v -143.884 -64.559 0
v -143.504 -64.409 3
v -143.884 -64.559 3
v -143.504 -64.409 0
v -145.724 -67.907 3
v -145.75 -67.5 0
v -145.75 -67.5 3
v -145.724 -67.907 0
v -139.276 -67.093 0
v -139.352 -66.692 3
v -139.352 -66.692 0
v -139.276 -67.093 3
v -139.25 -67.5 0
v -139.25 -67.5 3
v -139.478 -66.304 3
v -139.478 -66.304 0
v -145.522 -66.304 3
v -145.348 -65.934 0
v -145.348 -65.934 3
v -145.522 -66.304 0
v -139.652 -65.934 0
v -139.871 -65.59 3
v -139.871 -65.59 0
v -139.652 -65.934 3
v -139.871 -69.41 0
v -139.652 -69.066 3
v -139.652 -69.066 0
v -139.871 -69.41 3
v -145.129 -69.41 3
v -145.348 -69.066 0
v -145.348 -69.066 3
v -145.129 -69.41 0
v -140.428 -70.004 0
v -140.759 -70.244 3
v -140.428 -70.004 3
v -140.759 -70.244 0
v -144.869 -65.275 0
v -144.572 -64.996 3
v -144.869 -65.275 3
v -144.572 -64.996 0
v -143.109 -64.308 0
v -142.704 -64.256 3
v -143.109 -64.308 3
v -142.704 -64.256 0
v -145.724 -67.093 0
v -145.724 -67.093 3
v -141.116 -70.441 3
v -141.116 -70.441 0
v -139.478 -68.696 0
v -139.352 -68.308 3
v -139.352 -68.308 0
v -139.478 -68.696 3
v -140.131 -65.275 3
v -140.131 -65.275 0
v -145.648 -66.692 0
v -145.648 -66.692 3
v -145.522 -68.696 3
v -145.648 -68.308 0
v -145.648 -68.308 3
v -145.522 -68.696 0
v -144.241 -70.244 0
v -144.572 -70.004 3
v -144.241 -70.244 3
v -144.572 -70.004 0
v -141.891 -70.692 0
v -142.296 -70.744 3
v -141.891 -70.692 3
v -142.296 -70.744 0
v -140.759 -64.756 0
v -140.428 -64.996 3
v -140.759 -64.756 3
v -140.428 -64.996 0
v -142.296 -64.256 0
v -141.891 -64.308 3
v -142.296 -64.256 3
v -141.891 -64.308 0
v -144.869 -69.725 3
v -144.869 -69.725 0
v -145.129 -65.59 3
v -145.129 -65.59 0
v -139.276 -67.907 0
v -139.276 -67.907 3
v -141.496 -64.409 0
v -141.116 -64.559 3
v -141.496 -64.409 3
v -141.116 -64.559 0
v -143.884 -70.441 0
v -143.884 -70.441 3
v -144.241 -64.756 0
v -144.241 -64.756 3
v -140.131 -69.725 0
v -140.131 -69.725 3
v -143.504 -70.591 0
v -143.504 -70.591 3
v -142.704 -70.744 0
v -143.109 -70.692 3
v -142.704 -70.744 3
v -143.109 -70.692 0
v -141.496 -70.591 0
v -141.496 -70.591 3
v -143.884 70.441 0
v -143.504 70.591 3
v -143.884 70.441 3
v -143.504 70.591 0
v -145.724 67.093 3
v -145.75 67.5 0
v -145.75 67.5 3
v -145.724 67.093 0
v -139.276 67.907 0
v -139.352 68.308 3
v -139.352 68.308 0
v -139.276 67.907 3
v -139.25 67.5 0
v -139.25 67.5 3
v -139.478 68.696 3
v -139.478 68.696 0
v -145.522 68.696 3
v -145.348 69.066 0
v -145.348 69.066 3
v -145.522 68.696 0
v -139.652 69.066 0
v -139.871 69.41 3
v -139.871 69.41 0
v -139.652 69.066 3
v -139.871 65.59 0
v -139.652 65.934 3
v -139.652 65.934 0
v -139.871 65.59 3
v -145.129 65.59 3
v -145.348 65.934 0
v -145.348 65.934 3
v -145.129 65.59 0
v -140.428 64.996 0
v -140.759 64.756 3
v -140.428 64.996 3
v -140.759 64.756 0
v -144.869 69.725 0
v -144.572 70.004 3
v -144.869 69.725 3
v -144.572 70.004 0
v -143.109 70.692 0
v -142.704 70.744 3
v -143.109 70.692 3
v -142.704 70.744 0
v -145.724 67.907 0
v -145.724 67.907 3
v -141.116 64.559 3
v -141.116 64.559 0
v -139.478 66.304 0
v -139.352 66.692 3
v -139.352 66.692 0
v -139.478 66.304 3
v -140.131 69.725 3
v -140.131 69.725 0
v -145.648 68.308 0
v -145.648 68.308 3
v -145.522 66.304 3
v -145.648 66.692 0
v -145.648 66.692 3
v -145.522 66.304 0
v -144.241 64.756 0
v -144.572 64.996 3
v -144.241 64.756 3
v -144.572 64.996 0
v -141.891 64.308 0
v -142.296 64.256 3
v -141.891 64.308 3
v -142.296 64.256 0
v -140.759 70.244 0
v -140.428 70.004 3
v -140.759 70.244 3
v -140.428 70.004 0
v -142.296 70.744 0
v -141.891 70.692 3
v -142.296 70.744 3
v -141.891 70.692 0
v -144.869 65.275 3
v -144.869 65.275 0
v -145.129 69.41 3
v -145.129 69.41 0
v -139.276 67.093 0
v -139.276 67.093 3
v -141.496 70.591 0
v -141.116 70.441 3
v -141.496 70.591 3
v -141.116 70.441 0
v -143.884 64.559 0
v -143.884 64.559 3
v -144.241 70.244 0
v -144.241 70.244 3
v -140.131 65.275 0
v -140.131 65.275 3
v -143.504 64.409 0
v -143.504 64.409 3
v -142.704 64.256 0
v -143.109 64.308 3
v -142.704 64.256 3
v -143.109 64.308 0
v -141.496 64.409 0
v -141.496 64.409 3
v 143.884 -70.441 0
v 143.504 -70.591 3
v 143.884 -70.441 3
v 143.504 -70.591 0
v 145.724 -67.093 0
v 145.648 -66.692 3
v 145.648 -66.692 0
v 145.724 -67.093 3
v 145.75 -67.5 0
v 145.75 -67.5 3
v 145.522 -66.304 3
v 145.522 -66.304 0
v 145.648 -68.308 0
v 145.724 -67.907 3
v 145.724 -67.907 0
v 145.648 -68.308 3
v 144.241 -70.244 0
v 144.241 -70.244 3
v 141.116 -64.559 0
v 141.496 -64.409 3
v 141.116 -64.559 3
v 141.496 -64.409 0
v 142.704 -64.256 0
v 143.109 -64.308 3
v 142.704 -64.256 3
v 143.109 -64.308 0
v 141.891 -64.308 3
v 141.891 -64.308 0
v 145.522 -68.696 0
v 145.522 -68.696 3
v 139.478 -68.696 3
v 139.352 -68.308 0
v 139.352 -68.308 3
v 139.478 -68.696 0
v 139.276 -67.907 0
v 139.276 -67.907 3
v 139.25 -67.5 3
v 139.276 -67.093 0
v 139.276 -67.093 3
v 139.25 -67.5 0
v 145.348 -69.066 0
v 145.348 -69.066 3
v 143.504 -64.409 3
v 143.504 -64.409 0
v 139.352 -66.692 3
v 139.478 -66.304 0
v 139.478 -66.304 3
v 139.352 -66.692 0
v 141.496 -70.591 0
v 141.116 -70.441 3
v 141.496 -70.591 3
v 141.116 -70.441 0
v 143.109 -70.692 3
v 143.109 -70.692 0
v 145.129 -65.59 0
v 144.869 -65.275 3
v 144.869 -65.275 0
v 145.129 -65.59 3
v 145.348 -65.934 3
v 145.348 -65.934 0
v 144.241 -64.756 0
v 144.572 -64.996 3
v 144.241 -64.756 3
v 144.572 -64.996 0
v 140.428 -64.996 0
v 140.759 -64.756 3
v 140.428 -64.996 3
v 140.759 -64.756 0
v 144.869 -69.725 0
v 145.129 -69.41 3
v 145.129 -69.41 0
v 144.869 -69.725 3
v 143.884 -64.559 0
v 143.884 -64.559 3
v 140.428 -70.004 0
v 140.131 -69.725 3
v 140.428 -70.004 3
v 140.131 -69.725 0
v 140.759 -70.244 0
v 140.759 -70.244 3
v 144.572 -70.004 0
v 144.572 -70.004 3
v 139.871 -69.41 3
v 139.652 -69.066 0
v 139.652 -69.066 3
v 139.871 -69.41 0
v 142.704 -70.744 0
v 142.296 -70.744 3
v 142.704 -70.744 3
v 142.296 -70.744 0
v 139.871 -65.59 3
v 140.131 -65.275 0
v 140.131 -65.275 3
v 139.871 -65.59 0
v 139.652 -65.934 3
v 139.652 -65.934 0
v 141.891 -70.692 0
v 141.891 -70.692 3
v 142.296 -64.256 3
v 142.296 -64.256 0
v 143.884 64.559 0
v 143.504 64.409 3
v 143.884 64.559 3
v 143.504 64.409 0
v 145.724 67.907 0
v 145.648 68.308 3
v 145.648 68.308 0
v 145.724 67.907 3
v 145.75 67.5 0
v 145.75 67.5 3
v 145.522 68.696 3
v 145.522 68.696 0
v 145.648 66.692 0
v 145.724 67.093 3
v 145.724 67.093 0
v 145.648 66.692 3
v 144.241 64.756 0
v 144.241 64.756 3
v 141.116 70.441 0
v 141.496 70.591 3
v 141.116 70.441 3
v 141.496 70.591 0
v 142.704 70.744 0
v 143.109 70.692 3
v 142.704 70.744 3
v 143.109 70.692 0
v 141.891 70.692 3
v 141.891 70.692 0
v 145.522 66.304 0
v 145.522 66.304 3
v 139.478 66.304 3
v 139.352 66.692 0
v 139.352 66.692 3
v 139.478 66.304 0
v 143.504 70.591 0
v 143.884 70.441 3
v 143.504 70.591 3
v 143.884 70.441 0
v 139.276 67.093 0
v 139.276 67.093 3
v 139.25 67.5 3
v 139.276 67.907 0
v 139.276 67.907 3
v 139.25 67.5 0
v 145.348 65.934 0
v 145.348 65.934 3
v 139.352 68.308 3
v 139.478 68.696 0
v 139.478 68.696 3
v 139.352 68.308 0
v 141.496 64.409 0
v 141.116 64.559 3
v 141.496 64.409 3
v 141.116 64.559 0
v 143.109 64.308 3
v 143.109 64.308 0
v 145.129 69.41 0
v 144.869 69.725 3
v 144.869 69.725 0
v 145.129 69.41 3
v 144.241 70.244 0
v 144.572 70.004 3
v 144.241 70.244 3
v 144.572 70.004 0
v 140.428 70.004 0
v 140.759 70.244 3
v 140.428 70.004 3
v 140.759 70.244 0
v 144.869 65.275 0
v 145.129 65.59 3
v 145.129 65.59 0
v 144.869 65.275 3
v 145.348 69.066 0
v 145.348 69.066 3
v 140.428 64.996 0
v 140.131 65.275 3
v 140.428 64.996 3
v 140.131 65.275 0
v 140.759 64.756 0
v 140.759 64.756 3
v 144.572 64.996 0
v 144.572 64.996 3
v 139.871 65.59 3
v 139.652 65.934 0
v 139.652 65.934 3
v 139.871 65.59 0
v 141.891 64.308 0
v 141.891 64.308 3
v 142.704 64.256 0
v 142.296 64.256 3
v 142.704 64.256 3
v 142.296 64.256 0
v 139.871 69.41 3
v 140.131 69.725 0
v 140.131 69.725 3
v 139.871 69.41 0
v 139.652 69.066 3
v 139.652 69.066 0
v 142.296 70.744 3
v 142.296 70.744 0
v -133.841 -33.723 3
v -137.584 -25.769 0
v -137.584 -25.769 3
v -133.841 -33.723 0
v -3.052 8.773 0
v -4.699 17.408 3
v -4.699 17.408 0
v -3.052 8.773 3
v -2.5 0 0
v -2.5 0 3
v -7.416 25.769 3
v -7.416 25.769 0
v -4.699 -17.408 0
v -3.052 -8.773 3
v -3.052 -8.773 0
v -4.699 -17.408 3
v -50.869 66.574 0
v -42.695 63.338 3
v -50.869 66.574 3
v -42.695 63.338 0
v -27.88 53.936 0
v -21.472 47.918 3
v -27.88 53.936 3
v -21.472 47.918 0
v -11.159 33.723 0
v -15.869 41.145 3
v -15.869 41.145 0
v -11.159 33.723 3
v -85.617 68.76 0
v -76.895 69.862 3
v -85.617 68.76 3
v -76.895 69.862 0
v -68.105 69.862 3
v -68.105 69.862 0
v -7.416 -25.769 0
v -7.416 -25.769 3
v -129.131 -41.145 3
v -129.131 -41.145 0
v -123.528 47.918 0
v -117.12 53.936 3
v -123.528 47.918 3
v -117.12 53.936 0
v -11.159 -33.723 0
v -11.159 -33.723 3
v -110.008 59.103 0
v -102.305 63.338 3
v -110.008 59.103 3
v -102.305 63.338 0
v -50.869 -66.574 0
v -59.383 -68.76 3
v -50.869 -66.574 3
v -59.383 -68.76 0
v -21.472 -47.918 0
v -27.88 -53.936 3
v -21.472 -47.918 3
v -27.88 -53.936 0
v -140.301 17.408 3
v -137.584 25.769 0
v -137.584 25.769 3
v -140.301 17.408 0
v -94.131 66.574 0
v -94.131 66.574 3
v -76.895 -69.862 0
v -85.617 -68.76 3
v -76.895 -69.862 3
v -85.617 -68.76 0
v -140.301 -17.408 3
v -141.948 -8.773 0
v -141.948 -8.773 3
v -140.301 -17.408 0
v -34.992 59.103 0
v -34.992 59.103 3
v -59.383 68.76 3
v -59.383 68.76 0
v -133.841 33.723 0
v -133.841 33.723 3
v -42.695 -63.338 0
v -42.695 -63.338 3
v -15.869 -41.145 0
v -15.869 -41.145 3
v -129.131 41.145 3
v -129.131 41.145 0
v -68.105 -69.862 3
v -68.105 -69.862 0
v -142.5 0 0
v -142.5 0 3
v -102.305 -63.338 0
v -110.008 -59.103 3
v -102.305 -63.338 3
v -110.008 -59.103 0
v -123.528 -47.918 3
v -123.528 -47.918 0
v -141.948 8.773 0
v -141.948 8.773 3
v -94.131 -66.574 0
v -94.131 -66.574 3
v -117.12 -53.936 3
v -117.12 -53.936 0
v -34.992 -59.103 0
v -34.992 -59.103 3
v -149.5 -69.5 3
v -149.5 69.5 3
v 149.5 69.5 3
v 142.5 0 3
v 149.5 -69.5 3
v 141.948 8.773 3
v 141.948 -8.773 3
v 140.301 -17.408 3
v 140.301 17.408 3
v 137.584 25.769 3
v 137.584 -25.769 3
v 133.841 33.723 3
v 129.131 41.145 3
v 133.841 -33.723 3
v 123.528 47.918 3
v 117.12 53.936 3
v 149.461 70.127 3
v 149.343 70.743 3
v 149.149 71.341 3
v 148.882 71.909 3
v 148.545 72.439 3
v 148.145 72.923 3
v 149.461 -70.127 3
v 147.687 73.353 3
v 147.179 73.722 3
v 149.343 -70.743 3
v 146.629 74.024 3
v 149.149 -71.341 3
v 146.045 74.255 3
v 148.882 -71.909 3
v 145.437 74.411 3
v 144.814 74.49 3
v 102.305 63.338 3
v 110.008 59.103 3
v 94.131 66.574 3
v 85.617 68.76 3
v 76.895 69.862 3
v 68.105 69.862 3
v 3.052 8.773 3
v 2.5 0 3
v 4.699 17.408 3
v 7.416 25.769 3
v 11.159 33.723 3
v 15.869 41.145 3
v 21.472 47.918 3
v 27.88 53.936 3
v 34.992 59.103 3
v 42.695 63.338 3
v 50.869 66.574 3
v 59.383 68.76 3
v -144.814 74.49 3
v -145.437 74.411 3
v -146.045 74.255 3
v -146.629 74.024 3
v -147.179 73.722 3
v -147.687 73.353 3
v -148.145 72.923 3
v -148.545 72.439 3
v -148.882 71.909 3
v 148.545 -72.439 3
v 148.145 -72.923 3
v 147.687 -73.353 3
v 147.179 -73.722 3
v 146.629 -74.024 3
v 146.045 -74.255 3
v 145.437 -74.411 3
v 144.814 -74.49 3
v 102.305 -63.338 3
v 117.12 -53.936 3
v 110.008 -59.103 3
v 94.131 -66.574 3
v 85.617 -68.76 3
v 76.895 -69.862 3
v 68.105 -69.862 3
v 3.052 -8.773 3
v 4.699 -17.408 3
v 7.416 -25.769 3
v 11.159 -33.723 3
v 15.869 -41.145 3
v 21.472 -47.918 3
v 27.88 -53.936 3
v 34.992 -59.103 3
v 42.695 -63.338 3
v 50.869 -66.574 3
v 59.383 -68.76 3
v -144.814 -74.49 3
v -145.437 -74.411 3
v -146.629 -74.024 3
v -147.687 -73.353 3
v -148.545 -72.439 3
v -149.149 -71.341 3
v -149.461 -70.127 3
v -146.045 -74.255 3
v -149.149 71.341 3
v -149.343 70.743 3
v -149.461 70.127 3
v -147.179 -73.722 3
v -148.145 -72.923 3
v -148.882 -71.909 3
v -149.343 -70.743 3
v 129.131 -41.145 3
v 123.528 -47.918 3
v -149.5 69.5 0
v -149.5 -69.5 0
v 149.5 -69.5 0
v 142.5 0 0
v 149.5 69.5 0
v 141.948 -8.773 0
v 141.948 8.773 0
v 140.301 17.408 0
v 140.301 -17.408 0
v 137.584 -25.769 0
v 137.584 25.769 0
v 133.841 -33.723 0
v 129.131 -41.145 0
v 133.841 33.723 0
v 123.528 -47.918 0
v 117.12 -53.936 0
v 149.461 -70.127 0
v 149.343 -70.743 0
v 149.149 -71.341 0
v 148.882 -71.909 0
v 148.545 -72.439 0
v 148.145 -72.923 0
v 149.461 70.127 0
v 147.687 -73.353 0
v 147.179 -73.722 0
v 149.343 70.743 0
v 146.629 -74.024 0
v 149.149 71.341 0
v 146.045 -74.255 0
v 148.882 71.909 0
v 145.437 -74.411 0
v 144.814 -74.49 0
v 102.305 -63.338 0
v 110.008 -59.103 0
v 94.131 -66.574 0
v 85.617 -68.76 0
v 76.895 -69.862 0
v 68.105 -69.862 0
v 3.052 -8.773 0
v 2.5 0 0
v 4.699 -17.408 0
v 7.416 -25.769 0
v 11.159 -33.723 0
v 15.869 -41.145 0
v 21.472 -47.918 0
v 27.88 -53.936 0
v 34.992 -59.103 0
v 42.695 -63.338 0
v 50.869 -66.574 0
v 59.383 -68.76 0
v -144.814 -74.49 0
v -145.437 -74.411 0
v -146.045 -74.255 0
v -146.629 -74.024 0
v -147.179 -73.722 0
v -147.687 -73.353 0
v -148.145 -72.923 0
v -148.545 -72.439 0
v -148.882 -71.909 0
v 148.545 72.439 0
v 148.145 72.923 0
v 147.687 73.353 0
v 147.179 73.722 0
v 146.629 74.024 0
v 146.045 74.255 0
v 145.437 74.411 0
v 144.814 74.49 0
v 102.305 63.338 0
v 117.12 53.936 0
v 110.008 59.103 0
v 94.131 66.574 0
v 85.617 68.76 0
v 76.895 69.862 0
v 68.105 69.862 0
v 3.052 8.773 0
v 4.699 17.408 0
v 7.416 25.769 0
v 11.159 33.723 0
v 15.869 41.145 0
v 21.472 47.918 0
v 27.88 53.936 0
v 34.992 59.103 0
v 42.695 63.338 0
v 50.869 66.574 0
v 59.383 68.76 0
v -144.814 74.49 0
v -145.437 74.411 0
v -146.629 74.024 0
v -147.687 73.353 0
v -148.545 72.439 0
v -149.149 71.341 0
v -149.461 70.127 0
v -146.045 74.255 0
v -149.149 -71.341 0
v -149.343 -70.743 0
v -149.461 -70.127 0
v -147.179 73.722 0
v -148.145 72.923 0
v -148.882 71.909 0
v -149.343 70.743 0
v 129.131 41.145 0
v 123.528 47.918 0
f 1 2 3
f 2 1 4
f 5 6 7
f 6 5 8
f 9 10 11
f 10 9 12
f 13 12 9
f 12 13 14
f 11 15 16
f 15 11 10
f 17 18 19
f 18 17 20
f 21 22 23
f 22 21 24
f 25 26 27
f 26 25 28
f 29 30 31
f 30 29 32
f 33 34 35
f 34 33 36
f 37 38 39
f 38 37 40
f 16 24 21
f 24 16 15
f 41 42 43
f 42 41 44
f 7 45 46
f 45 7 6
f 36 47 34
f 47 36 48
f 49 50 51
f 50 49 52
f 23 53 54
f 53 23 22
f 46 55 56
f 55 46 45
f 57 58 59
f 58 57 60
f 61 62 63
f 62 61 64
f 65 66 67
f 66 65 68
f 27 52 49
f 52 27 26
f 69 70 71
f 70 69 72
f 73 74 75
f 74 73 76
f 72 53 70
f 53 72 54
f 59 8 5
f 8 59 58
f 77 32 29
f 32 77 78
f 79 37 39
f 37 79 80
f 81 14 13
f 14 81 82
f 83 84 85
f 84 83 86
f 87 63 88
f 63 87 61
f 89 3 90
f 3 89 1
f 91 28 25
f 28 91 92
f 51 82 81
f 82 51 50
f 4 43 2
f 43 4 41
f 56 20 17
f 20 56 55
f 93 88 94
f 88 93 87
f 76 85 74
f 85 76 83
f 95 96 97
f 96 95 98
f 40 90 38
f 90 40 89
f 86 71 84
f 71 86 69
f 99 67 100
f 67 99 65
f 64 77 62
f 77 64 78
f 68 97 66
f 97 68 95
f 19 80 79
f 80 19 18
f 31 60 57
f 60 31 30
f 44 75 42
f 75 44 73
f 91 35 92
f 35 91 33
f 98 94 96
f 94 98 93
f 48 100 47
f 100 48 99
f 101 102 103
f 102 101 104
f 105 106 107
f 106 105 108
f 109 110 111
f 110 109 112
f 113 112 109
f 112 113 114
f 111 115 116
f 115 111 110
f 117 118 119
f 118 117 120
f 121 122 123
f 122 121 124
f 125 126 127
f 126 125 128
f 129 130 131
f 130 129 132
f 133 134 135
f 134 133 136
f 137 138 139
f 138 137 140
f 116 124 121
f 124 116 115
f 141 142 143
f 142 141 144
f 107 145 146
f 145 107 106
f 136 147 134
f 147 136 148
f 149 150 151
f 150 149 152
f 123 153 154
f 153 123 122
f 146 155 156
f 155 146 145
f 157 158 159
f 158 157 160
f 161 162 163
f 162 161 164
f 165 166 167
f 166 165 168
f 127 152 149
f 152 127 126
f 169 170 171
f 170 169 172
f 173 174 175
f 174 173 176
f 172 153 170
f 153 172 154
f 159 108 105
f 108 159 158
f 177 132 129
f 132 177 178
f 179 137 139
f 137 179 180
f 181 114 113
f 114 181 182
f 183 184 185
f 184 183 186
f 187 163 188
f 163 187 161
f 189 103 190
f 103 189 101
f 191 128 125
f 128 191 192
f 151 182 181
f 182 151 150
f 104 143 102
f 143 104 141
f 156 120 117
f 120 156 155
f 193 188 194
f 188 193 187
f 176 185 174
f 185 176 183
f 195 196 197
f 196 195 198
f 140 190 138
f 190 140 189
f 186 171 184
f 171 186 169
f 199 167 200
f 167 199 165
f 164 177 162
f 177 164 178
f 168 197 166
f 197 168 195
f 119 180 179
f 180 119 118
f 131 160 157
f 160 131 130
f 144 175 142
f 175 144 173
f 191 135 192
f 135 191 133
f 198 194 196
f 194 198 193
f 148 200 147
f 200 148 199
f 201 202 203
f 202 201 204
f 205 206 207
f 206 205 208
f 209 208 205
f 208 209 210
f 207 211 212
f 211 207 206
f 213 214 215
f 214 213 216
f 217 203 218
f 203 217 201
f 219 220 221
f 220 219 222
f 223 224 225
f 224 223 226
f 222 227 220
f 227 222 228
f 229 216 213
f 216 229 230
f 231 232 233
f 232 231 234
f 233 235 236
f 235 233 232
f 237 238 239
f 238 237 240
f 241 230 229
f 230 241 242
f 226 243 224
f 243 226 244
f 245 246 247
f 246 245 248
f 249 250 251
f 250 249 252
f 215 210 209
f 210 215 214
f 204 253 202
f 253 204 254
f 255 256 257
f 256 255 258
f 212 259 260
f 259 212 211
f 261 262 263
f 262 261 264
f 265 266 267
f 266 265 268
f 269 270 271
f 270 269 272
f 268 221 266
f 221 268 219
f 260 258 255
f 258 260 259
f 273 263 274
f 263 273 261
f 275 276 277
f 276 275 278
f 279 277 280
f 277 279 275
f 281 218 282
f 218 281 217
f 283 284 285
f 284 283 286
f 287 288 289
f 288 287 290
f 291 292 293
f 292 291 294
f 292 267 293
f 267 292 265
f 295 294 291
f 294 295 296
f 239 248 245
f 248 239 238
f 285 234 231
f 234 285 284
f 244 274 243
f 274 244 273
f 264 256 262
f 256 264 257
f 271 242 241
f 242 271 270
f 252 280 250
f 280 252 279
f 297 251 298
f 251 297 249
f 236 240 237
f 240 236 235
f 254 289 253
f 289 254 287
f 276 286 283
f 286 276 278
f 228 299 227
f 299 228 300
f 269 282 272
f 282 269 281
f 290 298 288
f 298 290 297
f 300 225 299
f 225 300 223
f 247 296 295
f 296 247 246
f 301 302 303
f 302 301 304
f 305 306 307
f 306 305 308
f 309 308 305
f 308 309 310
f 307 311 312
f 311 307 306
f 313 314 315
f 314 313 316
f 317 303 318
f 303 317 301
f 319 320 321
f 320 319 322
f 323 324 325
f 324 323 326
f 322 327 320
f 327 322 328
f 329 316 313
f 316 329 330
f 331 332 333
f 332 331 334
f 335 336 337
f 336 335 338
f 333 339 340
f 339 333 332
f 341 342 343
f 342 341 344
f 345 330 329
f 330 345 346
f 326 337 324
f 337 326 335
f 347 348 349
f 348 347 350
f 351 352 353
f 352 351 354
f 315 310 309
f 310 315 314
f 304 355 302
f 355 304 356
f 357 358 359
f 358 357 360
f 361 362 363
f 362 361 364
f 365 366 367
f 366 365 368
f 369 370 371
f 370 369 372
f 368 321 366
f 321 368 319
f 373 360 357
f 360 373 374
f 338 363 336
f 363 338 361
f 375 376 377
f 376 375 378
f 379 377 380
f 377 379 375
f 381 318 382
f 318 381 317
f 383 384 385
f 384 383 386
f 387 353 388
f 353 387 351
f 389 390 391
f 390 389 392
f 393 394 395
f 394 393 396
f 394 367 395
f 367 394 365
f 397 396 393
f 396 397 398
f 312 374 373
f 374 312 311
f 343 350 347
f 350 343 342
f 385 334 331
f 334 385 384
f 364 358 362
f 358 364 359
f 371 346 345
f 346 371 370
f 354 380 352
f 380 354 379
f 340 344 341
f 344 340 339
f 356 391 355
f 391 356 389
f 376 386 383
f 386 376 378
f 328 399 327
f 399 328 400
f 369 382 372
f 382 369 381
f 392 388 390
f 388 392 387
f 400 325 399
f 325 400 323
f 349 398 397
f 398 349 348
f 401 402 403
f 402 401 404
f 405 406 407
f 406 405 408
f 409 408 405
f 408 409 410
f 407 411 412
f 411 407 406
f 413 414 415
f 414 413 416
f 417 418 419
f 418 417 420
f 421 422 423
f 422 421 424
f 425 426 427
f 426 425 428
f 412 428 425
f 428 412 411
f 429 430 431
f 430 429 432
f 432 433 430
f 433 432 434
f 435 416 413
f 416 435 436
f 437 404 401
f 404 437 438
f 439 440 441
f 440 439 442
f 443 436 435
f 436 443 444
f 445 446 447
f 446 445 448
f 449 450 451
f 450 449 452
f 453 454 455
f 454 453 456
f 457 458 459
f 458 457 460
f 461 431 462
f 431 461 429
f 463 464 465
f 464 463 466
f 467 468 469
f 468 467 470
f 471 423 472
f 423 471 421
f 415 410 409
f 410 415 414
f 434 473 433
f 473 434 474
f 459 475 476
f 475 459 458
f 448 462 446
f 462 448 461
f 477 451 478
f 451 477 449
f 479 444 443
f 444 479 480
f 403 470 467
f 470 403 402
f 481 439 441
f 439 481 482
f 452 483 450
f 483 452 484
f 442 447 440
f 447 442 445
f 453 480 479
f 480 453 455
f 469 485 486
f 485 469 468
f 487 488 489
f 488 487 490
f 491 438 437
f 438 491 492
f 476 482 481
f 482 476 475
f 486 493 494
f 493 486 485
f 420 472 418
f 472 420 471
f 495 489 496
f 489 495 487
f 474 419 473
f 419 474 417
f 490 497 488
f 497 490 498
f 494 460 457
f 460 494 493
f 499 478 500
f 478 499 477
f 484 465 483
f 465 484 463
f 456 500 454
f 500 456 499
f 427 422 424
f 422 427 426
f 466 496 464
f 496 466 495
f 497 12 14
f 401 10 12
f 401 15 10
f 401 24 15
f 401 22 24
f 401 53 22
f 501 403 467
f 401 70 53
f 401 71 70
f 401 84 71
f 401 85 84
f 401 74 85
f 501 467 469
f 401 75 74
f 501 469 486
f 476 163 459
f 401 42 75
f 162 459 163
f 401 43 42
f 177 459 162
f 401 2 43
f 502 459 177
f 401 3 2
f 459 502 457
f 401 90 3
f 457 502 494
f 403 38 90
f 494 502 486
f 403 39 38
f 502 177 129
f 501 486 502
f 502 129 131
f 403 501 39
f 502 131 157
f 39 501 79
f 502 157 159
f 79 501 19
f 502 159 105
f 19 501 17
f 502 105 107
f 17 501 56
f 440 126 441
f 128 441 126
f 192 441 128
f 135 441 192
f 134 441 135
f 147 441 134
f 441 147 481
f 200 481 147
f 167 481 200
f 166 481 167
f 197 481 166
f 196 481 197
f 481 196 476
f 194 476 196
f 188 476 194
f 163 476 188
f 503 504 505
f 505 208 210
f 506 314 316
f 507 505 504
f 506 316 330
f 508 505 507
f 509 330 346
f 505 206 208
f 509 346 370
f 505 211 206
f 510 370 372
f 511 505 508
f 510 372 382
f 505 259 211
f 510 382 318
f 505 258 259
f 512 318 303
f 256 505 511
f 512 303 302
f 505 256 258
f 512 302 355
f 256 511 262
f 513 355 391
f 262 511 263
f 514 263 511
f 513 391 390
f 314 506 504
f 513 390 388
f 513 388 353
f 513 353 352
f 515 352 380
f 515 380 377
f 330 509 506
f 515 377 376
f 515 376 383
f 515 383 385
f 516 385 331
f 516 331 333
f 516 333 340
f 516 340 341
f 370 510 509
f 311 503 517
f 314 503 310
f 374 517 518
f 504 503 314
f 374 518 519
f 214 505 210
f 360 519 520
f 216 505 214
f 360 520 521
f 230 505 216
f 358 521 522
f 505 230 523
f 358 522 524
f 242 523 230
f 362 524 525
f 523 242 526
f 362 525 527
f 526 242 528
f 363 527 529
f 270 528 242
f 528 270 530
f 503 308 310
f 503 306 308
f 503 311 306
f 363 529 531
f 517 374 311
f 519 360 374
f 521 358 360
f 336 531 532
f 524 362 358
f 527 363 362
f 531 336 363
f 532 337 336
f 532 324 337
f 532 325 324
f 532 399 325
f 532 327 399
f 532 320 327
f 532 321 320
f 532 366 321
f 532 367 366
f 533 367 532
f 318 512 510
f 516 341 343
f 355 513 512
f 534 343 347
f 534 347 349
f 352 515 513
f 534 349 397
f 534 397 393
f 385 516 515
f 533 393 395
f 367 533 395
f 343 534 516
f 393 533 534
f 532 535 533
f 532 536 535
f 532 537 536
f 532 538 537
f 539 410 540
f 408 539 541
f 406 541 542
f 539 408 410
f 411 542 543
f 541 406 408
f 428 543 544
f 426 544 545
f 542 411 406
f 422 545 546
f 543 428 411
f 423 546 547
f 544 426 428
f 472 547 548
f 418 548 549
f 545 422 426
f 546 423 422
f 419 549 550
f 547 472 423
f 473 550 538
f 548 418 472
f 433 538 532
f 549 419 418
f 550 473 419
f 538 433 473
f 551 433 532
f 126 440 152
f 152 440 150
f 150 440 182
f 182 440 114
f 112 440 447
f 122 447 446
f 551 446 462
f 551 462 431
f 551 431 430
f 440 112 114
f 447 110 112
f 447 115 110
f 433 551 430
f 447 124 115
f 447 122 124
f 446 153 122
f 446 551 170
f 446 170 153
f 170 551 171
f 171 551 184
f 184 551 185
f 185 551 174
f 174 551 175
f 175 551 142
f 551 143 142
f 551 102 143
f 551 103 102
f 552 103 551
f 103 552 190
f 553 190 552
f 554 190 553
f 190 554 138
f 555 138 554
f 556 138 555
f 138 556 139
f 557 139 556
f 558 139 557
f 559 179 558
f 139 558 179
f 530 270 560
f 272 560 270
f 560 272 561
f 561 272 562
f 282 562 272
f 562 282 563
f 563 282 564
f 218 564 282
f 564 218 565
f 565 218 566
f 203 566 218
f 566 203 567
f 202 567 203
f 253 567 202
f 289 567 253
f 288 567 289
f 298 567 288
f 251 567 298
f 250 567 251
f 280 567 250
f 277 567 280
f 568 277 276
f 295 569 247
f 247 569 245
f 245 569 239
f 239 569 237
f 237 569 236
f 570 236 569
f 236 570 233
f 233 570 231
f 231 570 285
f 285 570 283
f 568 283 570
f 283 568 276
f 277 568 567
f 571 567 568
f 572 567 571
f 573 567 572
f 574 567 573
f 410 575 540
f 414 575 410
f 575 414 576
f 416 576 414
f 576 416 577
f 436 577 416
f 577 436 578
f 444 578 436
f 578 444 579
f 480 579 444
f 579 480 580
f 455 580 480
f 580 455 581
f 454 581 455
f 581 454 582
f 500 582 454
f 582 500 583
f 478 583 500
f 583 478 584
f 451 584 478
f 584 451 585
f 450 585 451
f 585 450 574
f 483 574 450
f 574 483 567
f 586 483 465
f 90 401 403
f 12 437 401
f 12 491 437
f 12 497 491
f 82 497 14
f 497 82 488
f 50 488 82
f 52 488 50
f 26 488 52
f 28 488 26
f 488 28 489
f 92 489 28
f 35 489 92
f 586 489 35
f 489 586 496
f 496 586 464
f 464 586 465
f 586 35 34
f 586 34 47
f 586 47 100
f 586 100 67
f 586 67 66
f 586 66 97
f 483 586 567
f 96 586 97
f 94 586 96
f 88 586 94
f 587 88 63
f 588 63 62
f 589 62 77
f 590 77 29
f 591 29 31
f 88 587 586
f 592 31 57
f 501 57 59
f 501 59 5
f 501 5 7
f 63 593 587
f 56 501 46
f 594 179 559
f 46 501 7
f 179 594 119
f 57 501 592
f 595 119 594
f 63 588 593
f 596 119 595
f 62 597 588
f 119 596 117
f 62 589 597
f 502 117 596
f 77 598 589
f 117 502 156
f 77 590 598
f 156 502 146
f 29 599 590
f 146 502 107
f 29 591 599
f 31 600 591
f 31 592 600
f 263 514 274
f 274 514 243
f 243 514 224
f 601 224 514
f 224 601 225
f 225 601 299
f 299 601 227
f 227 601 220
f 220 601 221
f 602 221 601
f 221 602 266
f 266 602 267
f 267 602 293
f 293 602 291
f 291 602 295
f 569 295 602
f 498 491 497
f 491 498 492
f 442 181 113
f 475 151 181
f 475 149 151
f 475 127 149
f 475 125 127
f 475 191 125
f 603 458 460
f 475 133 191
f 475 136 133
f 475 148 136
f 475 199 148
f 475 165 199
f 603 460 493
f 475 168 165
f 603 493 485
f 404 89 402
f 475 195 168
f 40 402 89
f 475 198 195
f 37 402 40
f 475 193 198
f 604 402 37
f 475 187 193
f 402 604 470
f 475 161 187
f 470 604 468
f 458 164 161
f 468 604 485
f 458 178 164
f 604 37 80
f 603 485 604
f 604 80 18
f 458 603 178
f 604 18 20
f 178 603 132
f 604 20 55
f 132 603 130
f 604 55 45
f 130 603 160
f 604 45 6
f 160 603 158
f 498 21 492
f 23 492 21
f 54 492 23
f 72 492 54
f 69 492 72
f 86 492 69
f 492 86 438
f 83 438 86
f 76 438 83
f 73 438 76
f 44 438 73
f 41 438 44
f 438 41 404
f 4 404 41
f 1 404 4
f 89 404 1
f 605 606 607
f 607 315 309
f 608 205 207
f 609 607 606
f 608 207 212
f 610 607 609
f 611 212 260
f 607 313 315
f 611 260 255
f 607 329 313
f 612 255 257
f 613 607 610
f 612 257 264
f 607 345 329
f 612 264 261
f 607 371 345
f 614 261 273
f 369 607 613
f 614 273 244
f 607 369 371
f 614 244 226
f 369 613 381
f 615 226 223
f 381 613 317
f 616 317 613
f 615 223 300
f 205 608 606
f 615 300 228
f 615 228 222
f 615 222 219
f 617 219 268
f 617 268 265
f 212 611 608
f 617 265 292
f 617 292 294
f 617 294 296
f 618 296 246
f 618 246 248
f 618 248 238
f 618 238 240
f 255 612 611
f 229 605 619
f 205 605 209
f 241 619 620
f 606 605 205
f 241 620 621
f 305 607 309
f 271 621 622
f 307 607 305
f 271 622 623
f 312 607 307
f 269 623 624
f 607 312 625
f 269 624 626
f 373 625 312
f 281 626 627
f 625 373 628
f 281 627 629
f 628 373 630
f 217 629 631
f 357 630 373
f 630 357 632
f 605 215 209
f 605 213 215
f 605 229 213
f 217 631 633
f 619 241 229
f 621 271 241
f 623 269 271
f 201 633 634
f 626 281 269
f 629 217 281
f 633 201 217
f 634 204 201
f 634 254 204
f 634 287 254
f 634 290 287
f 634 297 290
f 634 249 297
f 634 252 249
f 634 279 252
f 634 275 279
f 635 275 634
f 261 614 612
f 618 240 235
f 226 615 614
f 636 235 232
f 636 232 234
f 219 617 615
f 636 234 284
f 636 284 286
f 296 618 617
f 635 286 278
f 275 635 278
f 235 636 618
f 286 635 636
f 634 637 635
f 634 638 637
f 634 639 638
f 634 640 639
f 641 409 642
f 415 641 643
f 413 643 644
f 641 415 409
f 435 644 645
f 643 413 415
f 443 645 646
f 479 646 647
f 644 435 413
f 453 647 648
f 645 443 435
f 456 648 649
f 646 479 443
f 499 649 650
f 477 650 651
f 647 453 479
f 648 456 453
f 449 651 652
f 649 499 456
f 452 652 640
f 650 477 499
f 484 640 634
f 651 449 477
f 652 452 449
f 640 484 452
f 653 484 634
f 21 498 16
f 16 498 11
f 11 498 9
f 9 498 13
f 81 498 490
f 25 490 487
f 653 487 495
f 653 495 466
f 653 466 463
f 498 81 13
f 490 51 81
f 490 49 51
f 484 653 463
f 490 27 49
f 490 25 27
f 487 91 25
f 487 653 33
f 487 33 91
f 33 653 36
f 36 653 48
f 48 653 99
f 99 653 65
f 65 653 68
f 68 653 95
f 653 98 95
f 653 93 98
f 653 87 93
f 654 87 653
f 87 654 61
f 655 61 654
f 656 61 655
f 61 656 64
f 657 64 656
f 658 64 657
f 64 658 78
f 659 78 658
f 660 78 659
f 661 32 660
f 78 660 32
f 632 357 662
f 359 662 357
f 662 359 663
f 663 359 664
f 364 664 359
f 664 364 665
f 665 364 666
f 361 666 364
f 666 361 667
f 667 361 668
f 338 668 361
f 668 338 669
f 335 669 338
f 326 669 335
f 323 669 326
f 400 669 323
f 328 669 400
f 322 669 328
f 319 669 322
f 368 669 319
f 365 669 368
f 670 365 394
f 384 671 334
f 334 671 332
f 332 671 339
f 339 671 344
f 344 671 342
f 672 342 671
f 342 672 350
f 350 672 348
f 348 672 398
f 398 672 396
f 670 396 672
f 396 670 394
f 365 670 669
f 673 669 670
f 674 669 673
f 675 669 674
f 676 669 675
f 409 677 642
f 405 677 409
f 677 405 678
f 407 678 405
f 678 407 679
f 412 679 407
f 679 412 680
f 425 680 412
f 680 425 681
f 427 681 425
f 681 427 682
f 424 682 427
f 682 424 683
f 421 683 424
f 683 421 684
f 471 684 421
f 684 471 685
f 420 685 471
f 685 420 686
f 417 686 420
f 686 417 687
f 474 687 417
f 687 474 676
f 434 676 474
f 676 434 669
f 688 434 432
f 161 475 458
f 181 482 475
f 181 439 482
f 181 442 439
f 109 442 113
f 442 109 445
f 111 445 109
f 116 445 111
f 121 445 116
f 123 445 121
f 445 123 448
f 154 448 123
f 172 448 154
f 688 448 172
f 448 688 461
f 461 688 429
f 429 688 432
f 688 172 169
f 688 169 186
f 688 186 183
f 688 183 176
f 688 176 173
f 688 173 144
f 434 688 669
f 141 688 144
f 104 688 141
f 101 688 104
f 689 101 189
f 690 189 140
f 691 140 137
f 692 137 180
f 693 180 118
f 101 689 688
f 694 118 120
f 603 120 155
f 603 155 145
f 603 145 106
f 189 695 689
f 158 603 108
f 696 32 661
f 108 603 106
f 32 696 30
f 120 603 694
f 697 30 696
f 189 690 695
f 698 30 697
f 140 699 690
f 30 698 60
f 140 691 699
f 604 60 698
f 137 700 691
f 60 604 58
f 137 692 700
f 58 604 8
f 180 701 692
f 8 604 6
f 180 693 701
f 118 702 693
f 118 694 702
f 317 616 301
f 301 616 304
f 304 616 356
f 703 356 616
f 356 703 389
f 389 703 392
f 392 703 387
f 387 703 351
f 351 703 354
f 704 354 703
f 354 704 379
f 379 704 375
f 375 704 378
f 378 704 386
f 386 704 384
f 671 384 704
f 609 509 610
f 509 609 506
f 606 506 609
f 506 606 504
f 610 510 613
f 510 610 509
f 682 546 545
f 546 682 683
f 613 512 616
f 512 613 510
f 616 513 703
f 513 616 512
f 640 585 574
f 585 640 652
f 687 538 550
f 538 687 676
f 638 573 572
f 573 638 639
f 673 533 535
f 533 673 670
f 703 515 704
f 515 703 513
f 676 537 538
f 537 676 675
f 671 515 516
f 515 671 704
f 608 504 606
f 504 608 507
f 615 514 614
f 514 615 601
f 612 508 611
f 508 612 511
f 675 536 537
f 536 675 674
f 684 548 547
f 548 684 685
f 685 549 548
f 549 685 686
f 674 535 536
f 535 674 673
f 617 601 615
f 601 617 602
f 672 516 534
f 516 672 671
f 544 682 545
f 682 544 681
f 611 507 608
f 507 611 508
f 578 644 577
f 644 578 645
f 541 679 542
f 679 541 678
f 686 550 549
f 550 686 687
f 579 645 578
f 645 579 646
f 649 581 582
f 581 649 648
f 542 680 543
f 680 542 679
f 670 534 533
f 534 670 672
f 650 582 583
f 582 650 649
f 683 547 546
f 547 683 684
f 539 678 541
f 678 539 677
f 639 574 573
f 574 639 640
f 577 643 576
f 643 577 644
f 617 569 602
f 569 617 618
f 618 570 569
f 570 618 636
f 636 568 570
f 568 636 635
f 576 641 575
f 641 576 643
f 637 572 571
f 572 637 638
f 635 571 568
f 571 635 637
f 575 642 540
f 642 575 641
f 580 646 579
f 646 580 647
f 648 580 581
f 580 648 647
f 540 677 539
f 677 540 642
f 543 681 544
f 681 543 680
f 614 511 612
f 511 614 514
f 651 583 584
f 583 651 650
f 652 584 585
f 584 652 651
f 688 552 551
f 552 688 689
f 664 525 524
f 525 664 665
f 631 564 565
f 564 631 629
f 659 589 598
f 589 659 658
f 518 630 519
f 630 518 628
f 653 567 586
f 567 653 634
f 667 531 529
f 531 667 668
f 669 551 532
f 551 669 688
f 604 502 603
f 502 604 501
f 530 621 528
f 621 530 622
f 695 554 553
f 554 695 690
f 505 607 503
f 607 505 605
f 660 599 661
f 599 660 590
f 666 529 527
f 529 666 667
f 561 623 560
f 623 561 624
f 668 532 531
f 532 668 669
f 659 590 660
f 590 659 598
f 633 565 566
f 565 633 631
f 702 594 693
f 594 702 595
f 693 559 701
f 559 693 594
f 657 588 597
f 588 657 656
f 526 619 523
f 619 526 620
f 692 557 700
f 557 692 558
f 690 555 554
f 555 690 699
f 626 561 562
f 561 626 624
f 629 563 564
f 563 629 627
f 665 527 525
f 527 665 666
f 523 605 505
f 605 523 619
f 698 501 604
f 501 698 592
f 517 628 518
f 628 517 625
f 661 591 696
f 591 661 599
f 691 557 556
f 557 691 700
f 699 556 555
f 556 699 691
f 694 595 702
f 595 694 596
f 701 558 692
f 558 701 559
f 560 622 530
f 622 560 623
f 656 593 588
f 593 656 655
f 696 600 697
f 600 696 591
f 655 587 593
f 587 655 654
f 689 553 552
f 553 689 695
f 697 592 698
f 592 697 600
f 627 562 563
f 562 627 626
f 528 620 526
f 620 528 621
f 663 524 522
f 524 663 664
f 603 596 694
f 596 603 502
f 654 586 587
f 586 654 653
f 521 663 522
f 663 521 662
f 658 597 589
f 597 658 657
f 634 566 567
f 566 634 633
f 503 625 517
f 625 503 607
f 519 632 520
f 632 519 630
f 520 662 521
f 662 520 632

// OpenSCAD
$fn = 50;


difference() {
	union() {
		hull() {
			translate(v = [-144.5000000000, 69.5000000000, 0]) {
				cylinder(h = 3, r = 5);
			}
			translate(v = [144.5000000000, 69.5000000000, 0]) {
				cylinder(h = 3, r = 5);
			}
			translate(v = [-144.5000000000, -69.5000000000, 0]) {
				cylinder(h = 3, r = 5);
			}
			translate(v = [144.5000000000, -69.5000000000, 0]) {
				cylinder(h = 3, r = 5);
			}
		}
	}
	union() {
		#translate(v = [-142.5000000000, -67.5000000000, -100.0000000000]) {
			cylinder(h = 200, r = 3.2500000000);
		}
		#translate(v = [-142.5000000000, 67.5000000000, -100.0000000000]) {
			cylinder(h = 200, r = 3.2500000000);
		}
		#translate(v = [142.5000000000, -67.5000000000, -100.0000000000]) {
			cylinder(h = 200, r = 3.2500000000);
		}
		#translate(v = [142.5000000000, 67.5000000000, -100.0000000000]) {
			cylinder(h = 200, r = 3.2500000000);
		}
		#translate(v = [-72.5000000000, 0, 0]) {
			cylinder(h = 3, r = 70.0000000000);
		}
		#translate(v = [72.5000000000, 0, 0]) {
			cylinder(h = 3, r = 70.0000000000);
		}
	}
}
